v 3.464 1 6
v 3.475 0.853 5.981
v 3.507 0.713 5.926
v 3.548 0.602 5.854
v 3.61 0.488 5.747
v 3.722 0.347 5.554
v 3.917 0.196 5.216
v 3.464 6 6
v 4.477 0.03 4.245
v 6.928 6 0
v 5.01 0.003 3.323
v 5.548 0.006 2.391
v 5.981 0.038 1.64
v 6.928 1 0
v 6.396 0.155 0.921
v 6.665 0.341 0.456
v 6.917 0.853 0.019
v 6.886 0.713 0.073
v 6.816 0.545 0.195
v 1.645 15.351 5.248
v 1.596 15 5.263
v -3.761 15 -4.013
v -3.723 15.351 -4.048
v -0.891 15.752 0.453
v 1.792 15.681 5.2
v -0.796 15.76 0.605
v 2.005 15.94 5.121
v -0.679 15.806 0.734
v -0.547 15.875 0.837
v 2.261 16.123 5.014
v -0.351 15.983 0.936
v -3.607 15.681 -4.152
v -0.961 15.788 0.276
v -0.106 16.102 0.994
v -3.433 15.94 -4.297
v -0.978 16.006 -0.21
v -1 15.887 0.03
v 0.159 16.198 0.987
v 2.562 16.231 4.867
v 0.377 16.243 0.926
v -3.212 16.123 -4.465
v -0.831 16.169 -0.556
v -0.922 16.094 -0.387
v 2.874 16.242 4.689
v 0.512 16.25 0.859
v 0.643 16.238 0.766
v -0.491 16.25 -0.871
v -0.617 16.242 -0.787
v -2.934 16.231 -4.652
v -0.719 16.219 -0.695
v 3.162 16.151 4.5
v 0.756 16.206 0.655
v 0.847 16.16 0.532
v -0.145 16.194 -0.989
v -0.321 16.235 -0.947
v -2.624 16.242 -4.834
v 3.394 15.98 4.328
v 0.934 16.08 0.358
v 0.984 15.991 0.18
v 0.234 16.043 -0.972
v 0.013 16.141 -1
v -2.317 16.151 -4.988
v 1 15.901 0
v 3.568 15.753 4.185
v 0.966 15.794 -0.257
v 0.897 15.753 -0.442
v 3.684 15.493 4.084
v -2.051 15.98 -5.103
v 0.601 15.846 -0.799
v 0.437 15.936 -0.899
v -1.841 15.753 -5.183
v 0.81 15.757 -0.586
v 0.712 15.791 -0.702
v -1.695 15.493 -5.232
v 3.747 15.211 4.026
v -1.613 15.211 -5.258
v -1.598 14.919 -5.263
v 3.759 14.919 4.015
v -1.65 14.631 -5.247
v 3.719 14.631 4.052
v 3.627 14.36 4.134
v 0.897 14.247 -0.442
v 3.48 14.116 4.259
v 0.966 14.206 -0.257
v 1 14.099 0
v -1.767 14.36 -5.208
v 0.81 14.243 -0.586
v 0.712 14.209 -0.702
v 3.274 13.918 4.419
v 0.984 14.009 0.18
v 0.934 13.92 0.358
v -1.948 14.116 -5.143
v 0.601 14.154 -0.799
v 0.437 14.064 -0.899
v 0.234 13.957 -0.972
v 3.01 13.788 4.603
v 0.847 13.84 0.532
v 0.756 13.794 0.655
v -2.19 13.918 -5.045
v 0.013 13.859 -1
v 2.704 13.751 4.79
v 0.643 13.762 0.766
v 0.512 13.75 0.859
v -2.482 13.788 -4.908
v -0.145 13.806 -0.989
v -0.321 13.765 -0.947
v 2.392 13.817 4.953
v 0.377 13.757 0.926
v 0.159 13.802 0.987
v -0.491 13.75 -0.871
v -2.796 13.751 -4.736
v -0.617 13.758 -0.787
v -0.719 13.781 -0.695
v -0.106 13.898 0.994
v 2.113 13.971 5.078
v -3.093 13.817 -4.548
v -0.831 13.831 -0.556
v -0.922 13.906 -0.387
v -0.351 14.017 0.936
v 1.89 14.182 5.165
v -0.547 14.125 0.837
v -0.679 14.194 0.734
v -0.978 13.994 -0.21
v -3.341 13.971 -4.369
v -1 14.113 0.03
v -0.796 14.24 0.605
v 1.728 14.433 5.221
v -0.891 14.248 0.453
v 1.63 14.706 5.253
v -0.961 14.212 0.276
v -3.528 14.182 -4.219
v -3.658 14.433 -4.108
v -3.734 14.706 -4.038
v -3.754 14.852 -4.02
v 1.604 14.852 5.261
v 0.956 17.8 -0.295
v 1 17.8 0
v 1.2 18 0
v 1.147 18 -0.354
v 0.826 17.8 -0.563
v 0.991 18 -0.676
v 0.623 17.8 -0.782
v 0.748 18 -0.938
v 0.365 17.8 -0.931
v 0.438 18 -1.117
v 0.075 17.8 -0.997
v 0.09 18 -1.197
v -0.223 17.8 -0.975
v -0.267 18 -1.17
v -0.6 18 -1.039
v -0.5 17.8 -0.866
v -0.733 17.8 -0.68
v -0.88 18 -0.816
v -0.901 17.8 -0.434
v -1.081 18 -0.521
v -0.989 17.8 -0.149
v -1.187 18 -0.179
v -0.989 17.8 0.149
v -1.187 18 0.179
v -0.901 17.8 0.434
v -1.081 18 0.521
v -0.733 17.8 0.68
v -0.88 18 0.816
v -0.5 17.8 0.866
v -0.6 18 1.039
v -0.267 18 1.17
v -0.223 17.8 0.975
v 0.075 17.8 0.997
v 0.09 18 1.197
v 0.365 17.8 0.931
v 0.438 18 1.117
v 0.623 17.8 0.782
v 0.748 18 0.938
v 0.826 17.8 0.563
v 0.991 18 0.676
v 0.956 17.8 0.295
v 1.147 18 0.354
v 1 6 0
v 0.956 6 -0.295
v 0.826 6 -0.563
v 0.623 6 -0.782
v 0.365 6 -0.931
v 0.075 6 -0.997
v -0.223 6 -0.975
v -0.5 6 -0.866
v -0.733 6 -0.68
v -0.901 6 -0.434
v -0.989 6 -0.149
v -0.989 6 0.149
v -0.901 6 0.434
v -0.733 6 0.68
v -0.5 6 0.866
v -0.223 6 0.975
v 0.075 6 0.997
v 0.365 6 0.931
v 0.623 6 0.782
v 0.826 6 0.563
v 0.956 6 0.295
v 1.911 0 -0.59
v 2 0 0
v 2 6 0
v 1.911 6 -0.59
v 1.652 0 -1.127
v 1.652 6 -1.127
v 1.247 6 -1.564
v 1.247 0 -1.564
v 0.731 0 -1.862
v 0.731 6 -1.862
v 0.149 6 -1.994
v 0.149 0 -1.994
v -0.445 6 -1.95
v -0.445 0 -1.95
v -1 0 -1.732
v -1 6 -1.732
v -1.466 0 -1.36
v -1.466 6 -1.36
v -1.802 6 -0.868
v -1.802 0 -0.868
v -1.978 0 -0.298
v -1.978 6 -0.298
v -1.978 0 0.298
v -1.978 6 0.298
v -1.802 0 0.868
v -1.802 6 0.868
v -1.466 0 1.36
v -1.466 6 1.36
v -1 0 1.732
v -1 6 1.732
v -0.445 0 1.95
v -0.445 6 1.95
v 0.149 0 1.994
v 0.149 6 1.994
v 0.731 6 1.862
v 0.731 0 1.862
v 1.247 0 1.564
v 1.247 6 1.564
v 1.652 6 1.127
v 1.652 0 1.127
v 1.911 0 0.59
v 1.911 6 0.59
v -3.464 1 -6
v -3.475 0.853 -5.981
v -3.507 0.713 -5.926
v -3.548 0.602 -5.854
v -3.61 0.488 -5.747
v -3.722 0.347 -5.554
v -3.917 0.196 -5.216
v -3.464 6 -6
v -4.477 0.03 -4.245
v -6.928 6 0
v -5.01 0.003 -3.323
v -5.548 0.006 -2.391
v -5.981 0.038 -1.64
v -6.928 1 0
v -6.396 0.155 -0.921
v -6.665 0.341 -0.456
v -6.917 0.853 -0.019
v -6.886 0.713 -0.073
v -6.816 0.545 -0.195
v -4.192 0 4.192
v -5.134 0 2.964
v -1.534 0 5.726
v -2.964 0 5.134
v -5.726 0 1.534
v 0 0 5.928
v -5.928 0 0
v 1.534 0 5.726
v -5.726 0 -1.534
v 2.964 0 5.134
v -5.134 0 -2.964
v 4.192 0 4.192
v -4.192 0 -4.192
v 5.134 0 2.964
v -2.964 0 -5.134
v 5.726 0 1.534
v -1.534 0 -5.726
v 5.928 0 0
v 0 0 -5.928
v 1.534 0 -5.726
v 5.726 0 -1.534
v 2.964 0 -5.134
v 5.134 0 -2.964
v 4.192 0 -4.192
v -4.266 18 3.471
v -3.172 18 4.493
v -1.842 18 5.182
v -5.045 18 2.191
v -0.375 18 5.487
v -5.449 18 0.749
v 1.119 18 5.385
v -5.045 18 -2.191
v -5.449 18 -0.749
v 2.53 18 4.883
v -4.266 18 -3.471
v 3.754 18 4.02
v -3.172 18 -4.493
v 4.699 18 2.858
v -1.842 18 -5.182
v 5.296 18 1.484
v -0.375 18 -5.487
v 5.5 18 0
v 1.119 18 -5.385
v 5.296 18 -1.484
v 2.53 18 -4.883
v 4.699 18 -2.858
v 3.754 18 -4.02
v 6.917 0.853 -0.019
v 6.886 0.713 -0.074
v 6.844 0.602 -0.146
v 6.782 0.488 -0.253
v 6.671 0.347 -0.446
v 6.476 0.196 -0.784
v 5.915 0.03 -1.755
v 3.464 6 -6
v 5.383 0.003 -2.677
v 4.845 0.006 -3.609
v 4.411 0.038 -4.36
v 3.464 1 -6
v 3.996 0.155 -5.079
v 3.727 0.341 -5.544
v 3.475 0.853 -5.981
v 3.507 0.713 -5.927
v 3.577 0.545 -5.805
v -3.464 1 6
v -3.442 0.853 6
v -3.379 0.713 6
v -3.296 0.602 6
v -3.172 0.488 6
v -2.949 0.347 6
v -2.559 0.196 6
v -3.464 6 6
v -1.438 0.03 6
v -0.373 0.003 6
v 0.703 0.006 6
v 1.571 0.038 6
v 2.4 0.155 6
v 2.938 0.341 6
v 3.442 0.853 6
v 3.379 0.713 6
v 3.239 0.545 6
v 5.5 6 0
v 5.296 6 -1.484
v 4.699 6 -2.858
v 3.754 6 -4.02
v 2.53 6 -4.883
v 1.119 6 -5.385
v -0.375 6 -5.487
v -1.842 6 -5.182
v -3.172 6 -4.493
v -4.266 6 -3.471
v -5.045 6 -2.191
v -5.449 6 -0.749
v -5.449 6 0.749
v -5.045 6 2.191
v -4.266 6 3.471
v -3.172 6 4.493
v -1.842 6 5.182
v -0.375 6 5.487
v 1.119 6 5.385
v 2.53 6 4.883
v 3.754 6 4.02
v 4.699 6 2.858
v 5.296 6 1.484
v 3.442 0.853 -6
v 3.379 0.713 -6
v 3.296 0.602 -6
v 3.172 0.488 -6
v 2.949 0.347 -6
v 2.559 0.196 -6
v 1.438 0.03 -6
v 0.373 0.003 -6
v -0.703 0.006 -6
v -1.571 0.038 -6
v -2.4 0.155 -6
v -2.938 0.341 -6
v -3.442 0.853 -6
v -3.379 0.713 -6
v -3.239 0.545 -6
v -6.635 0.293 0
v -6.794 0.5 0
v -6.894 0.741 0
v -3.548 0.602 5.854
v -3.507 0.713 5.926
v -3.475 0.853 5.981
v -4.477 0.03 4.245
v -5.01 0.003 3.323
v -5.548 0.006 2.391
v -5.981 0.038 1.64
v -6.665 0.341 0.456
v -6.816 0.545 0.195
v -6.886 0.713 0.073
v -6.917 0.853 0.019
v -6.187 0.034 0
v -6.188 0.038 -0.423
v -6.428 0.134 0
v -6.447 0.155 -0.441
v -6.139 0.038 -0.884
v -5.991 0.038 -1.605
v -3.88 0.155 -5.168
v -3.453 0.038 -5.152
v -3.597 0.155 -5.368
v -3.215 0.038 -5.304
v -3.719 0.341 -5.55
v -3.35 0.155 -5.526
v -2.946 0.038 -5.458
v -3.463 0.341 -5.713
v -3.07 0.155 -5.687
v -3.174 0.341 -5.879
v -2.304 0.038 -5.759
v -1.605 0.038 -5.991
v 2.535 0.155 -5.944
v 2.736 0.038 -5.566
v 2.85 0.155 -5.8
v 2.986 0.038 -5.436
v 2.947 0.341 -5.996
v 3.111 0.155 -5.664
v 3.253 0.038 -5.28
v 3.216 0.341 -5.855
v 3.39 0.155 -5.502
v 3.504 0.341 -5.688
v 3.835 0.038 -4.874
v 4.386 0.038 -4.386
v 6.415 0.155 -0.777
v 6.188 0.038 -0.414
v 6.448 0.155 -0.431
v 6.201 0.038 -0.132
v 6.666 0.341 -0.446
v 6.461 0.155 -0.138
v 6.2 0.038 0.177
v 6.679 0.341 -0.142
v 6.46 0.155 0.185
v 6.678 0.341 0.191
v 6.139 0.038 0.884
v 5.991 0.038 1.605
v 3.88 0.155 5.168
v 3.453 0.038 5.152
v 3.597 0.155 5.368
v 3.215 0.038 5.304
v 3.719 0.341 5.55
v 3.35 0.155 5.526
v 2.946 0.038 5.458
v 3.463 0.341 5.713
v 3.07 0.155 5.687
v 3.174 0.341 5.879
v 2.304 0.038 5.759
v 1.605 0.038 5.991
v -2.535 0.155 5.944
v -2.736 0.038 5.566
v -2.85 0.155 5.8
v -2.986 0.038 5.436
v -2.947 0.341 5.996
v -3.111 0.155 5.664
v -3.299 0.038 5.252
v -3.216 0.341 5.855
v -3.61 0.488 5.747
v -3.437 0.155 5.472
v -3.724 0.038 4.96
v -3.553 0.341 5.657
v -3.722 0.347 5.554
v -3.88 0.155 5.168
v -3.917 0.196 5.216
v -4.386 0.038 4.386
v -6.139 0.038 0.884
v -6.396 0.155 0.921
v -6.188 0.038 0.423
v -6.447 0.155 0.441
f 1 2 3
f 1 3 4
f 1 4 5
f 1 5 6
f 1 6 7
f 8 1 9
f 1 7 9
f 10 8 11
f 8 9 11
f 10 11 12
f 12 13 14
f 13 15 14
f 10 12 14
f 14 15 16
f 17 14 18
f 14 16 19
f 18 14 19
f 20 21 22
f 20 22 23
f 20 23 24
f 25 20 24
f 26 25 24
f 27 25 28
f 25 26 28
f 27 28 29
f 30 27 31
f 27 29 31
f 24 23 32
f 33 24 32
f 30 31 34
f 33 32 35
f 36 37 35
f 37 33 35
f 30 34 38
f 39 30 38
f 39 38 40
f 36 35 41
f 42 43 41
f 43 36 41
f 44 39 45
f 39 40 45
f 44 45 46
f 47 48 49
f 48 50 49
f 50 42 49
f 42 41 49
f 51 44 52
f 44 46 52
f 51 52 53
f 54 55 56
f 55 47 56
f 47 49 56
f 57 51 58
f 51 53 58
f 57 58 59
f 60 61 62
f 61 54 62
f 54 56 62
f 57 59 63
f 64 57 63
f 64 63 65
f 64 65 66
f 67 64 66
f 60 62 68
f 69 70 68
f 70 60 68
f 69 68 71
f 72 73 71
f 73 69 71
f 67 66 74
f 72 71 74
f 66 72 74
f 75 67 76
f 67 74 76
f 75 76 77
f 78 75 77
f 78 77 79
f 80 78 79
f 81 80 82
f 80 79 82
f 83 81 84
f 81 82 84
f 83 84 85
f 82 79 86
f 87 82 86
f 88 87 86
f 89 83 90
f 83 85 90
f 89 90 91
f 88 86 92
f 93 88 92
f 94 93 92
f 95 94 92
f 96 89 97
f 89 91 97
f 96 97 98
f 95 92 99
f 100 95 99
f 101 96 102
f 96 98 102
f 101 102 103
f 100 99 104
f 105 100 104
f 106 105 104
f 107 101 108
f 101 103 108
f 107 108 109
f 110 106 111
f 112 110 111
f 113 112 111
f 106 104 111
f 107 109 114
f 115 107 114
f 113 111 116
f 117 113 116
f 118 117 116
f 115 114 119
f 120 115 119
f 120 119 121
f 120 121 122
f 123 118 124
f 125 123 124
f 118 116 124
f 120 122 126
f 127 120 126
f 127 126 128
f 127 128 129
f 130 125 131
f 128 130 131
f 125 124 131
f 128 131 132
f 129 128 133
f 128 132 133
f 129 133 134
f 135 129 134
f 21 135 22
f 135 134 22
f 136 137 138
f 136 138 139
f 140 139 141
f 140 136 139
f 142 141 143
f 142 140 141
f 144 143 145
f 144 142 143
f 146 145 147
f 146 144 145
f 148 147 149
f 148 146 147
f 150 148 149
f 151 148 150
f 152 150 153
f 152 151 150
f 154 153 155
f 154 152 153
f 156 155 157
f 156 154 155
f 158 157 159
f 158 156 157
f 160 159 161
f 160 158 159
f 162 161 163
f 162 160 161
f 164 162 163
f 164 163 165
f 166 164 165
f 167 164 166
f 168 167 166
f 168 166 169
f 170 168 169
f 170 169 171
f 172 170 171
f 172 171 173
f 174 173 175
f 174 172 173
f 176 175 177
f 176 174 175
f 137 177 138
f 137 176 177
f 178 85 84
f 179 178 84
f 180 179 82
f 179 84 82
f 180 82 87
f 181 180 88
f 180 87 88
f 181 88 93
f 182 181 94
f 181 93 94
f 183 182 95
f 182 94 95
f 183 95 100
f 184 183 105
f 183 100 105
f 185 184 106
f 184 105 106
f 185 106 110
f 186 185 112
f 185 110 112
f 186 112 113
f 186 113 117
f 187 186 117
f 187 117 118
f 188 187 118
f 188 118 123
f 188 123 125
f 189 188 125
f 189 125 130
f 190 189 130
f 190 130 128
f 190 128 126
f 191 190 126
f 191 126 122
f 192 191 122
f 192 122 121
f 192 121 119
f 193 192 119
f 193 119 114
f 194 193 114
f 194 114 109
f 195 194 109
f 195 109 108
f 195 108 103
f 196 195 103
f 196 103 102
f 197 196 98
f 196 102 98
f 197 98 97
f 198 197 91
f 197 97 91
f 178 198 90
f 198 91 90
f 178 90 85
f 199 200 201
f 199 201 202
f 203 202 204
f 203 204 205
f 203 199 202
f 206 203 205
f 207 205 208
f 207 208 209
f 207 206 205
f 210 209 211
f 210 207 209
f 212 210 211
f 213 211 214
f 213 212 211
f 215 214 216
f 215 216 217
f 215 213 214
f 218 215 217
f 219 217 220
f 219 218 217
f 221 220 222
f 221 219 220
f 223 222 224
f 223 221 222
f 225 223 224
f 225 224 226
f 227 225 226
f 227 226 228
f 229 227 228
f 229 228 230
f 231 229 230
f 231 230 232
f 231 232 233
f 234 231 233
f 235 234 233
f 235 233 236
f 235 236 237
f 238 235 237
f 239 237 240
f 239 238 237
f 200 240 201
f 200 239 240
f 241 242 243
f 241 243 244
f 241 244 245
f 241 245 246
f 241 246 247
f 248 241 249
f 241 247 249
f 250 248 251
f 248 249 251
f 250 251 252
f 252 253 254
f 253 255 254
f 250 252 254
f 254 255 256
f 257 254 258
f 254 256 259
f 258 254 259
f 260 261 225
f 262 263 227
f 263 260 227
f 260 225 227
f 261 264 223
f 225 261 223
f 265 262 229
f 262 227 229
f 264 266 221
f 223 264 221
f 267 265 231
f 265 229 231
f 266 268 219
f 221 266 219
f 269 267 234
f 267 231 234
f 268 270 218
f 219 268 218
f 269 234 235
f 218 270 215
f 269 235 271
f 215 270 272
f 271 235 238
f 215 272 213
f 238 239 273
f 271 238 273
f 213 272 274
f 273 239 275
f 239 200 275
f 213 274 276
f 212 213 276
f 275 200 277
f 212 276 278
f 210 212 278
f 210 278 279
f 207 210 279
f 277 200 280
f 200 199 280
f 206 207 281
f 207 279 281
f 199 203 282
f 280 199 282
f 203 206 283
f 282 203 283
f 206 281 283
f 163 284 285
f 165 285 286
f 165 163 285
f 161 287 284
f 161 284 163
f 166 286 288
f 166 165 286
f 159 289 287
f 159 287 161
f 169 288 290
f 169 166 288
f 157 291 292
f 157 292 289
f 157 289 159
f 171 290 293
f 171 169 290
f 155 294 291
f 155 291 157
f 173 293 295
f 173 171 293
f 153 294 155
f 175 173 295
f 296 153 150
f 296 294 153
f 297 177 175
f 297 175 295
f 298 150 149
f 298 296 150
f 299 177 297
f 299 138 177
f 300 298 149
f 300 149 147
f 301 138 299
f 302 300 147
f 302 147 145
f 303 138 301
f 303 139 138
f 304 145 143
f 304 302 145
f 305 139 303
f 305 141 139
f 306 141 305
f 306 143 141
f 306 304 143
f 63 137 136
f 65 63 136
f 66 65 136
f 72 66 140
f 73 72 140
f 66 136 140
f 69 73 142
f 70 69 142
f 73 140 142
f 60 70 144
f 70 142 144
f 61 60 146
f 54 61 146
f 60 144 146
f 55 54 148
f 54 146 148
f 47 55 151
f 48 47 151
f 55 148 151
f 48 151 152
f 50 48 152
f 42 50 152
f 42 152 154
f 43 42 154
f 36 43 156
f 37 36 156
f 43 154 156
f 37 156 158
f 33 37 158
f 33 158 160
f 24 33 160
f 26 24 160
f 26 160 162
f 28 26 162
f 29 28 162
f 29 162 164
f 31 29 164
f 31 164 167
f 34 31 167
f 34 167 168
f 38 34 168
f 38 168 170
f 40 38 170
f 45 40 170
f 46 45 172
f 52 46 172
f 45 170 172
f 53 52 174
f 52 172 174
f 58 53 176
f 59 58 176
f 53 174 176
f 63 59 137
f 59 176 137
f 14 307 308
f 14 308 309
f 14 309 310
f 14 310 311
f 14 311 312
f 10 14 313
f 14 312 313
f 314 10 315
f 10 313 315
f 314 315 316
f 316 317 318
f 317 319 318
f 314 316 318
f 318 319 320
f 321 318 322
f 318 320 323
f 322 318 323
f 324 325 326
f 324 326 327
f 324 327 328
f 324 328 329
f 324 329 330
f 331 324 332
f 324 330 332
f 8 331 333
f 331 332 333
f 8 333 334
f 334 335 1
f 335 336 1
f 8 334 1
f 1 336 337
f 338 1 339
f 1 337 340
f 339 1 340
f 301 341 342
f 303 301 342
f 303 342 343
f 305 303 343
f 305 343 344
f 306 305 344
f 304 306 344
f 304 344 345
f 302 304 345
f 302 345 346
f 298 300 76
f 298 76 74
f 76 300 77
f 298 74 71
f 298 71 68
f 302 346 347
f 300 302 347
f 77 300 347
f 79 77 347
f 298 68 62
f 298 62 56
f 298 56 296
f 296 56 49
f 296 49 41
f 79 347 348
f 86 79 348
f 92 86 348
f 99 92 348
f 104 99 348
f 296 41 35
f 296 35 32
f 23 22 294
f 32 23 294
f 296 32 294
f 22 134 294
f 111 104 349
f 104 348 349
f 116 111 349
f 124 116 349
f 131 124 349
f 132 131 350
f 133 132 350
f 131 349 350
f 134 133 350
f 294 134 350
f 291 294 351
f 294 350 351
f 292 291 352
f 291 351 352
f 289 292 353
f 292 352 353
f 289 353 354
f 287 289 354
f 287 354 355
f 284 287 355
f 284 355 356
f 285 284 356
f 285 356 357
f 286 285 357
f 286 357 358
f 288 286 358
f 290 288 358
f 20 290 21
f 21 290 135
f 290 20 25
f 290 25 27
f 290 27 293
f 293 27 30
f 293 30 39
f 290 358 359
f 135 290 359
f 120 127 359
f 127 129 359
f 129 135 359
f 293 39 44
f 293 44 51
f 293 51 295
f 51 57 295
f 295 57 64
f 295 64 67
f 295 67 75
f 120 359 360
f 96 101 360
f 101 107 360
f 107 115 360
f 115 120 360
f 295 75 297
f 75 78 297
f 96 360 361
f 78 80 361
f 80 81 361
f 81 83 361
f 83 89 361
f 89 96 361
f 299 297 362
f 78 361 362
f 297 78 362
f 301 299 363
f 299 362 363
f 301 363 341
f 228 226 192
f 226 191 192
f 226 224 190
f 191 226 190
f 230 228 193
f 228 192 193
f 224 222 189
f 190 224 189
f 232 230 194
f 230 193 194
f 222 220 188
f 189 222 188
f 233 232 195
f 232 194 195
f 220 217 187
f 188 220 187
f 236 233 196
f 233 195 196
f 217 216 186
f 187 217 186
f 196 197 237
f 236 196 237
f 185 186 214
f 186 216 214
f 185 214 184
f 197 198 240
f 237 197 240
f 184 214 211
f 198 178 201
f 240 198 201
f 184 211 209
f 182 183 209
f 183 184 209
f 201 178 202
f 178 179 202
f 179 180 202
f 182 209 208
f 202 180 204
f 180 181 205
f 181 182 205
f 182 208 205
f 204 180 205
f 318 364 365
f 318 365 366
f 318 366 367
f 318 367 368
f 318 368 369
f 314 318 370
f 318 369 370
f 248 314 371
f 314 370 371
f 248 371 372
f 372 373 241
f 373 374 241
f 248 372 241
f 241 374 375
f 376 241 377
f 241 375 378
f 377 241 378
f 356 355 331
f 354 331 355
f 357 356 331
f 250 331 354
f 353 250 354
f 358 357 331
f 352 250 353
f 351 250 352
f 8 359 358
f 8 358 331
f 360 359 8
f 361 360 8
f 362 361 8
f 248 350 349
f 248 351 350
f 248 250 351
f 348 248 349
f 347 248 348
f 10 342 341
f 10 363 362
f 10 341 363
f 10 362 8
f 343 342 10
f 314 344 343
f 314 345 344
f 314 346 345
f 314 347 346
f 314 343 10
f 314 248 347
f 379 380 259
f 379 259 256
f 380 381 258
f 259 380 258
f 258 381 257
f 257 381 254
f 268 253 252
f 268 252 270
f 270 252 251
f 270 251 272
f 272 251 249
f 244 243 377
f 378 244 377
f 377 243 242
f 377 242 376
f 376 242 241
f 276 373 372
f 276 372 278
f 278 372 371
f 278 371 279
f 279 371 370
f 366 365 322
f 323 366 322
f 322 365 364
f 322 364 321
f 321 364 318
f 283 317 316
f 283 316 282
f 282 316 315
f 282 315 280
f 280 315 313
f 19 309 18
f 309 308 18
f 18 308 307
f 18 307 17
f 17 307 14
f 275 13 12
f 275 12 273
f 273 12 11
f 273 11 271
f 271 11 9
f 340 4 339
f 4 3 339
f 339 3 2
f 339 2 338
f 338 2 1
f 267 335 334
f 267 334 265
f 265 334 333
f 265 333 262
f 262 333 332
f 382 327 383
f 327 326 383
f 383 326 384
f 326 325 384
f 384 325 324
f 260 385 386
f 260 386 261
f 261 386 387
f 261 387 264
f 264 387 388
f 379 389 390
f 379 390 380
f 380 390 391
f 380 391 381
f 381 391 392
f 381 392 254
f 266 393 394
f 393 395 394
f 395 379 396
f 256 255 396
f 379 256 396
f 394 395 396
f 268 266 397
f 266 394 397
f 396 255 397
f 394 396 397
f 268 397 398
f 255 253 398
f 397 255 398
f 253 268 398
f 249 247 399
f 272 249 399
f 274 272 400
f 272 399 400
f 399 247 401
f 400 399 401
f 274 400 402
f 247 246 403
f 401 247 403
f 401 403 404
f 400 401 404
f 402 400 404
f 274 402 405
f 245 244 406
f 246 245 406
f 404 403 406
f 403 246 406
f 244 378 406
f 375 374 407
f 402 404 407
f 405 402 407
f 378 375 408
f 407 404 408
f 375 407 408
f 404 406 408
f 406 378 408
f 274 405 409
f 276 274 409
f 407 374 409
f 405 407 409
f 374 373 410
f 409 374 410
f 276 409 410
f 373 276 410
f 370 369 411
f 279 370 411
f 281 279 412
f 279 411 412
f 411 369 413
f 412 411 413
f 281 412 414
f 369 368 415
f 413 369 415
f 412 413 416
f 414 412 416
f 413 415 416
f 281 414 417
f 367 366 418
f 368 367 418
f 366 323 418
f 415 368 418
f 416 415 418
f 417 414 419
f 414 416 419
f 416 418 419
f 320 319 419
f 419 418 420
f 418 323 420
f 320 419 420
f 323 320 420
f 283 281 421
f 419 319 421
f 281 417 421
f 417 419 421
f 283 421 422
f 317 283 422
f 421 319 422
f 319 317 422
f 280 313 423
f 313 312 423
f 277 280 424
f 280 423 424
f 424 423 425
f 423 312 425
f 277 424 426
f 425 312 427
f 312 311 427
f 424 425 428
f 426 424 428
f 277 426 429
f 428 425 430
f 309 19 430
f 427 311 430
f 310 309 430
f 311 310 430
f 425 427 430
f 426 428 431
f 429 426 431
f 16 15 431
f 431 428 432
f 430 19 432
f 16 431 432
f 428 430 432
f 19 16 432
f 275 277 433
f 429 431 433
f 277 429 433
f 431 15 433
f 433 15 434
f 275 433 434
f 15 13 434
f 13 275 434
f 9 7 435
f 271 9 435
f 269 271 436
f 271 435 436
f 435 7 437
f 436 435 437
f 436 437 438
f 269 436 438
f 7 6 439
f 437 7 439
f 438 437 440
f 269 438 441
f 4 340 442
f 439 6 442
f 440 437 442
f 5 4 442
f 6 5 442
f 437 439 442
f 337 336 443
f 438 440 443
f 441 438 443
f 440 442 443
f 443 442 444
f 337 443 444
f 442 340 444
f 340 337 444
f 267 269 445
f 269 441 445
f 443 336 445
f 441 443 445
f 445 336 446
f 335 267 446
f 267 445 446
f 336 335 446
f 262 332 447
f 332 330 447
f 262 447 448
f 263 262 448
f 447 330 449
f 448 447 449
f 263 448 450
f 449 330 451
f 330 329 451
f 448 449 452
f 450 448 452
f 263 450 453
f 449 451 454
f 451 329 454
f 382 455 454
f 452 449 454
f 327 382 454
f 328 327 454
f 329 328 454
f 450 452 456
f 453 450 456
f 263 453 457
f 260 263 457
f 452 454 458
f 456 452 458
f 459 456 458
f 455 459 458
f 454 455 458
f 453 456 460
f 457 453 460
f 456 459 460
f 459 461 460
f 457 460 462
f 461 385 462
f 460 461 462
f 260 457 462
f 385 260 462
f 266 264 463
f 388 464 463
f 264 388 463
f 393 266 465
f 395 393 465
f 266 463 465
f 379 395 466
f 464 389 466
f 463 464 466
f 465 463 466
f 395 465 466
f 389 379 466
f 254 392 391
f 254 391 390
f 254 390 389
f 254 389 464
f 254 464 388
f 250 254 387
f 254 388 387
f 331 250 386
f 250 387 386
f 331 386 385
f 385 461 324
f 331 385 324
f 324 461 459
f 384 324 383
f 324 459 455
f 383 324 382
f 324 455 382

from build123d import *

# Parameters (mm, degrees)
SKETCH1_R                = 2
BASE_DEPTH               = 6
SKETCH2_R                = 5.5
SHAFT_HOLDING_BODY_DEPTH = 12
M3X0_5_1_D               = 2.5
SKETCH13_R               = 1
SHAFT_HOLE_DEPTH         = 19.0000001
SH_C_SIZE                = 0.2


with BuildPart() as part:
    # Sketch1 → BASE (new body)
    with BuildSketch(Plane(origin=(0, 0, 0), x_dir=(1, 0, 0), z_dir=(0, 1, 0))):
        Polygon((3.464101615, -6), (6.92820323, 0), (3.464101615, 6), (-3.464101615, 6), (-6.92820323, 0), (-3.464101615, -6), align=None)
        Circle(SKETCH1_R, mode=Mode.SUBTRACT)
    extrude(amount=BASE_DEPTH)

    # Sketch2 → SHAFT HOLDING BODY (add)
    with BuildSketch(Plane(origin=(0, 6, 0), x_dir=(1, 0, 0), z_dir=(0, 1, 0))):
        Circle(SKETCH2_R)
    extrude(amount=SHAFT_HOLDING_BODY_DEPTH)

    # M3x0.5 螺纹孔1 (through all)
    with Locations(Plane(origin=(2.75, 6, 4.763139721), x_dir=(0.866025404, 0, -0.5), z_dir=(0.5, 0, 0.866025404))):
        with Locations((0, 9)):
            Hole(M3X0_5_1_D / 2)

    # Sketch9 → BASE CHAMFER RELIEF (revolve, cut)
    with BuildSketch(Plane.XY):
        with BuildLine():
            Line((-6.92820323, 1), (-6.92820323, 0))
            Line((-6.92820323, 0), (-5.92820323, 0))
            ThreePointArc((-5.92820323, 0), (-6.635310011, 0.292893219), (-6.92820323, 1))
        make_face()
    revolve(axis=Axis((0, 22.106901259, 0), (0, -1, 0)), mode=Mode.SUBTRACT)

    # Sketch13 → SHAFT HOLE (cut, through all)
    with BuildSketch(Plane(origin=(0, 18, 0), x_dir=(1, 0, 0), z_dir=(0, 1, 0))):
        Circle(SKETCH13_R)
    extrude(amount=-SHAFT_HOLE_DEPTH, mode=Mode.SUBTRACT)

    # SH C
    sh_c_edges = [part.edges().sort_by_distance(p)[0] for p in [
        (-1, 18, 0),
    ]]
    chamfer(sh_c_edges, length=SH_C_SIZE)


solid = part.part
